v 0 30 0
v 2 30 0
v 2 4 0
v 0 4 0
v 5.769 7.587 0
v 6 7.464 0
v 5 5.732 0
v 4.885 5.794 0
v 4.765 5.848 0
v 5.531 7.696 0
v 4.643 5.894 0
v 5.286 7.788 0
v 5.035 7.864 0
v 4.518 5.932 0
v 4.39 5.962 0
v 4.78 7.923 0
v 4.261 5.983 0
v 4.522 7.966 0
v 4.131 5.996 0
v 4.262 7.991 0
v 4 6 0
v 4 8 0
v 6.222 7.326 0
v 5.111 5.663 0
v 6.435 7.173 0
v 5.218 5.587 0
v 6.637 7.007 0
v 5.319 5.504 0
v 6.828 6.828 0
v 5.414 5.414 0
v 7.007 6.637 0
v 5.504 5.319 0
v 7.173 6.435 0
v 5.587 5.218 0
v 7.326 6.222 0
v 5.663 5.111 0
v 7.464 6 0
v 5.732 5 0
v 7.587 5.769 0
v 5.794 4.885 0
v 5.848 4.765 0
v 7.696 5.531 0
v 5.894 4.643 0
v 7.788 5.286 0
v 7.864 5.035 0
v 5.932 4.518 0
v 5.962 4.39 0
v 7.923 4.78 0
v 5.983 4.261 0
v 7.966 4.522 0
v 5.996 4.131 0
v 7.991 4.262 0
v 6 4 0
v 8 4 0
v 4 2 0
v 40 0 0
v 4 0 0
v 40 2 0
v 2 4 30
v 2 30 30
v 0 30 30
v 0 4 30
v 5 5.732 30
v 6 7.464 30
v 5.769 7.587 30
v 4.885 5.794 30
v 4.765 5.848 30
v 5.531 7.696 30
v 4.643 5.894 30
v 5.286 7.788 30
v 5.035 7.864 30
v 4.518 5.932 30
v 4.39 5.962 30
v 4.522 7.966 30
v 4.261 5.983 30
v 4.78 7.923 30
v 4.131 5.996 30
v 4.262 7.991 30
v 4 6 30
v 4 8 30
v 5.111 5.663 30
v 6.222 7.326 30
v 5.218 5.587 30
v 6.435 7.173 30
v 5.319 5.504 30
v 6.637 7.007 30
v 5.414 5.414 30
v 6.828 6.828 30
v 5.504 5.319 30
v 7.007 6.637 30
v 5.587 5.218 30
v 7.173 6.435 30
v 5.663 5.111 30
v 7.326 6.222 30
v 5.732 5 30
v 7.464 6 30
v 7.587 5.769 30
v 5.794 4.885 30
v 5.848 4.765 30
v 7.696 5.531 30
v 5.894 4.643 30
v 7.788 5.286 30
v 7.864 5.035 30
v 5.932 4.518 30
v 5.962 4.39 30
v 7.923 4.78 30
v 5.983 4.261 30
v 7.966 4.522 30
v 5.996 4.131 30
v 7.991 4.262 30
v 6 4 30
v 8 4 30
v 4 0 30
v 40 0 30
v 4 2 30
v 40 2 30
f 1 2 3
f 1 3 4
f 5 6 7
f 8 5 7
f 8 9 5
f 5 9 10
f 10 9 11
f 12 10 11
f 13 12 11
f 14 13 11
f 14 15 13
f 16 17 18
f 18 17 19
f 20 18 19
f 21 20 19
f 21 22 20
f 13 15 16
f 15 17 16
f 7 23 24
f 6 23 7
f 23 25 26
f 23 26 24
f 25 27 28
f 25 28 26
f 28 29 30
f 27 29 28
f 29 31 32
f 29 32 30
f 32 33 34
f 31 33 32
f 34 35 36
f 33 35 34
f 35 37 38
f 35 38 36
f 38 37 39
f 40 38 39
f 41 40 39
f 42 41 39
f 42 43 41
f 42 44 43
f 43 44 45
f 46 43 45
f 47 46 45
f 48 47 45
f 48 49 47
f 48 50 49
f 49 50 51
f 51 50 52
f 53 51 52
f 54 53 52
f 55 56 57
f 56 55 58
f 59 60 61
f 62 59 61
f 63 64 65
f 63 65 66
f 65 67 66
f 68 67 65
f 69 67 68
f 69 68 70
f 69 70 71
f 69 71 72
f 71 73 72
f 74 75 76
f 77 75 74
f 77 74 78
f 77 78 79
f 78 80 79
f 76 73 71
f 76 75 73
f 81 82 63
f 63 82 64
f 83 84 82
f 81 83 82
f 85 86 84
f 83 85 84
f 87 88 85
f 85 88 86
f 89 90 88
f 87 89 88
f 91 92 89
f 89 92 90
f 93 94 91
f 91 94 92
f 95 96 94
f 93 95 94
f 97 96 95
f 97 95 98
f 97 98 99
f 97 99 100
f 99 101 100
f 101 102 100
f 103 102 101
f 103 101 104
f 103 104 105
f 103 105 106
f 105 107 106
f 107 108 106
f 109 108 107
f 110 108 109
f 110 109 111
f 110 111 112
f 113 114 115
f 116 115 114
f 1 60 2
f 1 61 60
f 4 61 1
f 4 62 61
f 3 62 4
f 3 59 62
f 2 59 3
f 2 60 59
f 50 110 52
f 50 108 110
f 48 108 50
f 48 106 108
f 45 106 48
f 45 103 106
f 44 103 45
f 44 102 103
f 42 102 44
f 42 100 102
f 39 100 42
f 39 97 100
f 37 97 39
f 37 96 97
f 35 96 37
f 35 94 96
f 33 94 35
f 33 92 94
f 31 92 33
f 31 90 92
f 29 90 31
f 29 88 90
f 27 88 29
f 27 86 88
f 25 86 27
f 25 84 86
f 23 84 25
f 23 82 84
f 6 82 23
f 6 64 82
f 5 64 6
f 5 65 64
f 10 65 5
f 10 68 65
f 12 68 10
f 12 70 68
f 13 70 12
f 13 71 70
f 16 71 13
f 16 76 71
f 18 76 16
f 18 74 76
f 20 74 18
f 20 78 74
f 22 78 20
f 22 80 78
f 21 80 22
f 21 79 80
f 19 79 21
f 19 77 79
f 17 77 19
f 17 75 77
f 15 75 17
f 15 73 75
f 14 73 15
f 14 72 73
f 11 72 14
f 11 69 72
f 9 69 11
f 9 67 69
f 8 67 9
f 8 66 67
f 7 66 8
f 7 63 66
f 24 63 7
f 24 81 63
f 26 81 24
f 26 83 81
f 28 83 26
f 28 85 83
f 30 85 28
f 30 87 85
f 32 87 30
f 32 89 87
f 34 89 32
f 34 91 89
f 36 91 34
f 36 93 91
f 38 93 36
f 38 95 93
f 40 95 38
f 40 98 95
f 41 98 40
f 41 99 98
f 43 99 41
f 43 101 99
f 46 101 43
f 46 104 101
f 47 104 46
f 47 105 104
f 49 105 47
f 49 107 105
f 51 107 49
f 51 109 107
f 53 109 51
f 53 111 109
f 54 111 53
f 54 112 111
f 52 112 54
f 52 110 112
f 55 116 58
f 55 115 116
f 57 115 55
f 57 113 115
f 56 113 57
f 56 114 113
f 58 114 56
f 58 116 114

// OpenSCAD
// Units: mm
thickness_mm = 2.0;
bend_radius_mm = 2.0;
k_factor = 0.45;
bend_angle_deg = 90;
bend_angle_rad = bend_angle_deg * PI / 180;

outside_len_x_mm = 40.0;
outside_len_y_mm = 30.0;
bracket_width_mm = 30.0;

outer_radius_mm = bend_radius_mm + thickness_mm;
outside_setback_mm = outer_radius_mm * tan(bend_angle_deg / 2);
bend_allowance_mm = bend_angle_rad * (bend_radius_mm + k_factor * thickness_mm);
bend_deduction_mm = 2 * outside_setback_mm - bend_allowance_mm;
flat_length_mm = outside_len_x_mm + outside_len_y_mm - bend_deduction_mm;

straight_x_mm = outside_len_x_mm - outside_setback_mm;
straight_y_mm = outside_len_y_mm - outside_setback_mm;

$fn = 96;

echo(str(
    "MAKERBENCH-SHEETMETAL: {\"thickness_mm\": ",
    thickness_mm,
    ", \"bend_radius_mm\": ",
    bend_radius_mm,
    ", \"flat_length_mm\": ",
    flat_length_mm,
    "}"
));

module sheet_metal_l_bracket() {
    linear_extrude(height = bracket_width_mm, convexity = 10)
        union() {
            translate([outer_radius_mm, 0])
                square([straight_x_mm, thickness_mm], center = false);

            translate([0, outer_radius_mm])
                square([thickness_mm, straight_y_mm], center = false);

            translate([outer_radius_mm, outer_radius_mm])
                difference() {
                    circle(r = outer_radius_mm);
                    circle(r = bend_radius_mm);
                    translate([-outer_radius_mm - 1, -outer_radius_mm - 1])
                        square([outer_radius_mm + 1, 2 * outer_radius_mm + 2], center = false);
                    translate([-outer_radius_mm - 1, -outer_radius_mm - 1])
                        square([2 * outer_radius_mm + 2, outer_radius_mm + 1], center = false);
                }
        }
}

sheet_metal_l_bracket();
